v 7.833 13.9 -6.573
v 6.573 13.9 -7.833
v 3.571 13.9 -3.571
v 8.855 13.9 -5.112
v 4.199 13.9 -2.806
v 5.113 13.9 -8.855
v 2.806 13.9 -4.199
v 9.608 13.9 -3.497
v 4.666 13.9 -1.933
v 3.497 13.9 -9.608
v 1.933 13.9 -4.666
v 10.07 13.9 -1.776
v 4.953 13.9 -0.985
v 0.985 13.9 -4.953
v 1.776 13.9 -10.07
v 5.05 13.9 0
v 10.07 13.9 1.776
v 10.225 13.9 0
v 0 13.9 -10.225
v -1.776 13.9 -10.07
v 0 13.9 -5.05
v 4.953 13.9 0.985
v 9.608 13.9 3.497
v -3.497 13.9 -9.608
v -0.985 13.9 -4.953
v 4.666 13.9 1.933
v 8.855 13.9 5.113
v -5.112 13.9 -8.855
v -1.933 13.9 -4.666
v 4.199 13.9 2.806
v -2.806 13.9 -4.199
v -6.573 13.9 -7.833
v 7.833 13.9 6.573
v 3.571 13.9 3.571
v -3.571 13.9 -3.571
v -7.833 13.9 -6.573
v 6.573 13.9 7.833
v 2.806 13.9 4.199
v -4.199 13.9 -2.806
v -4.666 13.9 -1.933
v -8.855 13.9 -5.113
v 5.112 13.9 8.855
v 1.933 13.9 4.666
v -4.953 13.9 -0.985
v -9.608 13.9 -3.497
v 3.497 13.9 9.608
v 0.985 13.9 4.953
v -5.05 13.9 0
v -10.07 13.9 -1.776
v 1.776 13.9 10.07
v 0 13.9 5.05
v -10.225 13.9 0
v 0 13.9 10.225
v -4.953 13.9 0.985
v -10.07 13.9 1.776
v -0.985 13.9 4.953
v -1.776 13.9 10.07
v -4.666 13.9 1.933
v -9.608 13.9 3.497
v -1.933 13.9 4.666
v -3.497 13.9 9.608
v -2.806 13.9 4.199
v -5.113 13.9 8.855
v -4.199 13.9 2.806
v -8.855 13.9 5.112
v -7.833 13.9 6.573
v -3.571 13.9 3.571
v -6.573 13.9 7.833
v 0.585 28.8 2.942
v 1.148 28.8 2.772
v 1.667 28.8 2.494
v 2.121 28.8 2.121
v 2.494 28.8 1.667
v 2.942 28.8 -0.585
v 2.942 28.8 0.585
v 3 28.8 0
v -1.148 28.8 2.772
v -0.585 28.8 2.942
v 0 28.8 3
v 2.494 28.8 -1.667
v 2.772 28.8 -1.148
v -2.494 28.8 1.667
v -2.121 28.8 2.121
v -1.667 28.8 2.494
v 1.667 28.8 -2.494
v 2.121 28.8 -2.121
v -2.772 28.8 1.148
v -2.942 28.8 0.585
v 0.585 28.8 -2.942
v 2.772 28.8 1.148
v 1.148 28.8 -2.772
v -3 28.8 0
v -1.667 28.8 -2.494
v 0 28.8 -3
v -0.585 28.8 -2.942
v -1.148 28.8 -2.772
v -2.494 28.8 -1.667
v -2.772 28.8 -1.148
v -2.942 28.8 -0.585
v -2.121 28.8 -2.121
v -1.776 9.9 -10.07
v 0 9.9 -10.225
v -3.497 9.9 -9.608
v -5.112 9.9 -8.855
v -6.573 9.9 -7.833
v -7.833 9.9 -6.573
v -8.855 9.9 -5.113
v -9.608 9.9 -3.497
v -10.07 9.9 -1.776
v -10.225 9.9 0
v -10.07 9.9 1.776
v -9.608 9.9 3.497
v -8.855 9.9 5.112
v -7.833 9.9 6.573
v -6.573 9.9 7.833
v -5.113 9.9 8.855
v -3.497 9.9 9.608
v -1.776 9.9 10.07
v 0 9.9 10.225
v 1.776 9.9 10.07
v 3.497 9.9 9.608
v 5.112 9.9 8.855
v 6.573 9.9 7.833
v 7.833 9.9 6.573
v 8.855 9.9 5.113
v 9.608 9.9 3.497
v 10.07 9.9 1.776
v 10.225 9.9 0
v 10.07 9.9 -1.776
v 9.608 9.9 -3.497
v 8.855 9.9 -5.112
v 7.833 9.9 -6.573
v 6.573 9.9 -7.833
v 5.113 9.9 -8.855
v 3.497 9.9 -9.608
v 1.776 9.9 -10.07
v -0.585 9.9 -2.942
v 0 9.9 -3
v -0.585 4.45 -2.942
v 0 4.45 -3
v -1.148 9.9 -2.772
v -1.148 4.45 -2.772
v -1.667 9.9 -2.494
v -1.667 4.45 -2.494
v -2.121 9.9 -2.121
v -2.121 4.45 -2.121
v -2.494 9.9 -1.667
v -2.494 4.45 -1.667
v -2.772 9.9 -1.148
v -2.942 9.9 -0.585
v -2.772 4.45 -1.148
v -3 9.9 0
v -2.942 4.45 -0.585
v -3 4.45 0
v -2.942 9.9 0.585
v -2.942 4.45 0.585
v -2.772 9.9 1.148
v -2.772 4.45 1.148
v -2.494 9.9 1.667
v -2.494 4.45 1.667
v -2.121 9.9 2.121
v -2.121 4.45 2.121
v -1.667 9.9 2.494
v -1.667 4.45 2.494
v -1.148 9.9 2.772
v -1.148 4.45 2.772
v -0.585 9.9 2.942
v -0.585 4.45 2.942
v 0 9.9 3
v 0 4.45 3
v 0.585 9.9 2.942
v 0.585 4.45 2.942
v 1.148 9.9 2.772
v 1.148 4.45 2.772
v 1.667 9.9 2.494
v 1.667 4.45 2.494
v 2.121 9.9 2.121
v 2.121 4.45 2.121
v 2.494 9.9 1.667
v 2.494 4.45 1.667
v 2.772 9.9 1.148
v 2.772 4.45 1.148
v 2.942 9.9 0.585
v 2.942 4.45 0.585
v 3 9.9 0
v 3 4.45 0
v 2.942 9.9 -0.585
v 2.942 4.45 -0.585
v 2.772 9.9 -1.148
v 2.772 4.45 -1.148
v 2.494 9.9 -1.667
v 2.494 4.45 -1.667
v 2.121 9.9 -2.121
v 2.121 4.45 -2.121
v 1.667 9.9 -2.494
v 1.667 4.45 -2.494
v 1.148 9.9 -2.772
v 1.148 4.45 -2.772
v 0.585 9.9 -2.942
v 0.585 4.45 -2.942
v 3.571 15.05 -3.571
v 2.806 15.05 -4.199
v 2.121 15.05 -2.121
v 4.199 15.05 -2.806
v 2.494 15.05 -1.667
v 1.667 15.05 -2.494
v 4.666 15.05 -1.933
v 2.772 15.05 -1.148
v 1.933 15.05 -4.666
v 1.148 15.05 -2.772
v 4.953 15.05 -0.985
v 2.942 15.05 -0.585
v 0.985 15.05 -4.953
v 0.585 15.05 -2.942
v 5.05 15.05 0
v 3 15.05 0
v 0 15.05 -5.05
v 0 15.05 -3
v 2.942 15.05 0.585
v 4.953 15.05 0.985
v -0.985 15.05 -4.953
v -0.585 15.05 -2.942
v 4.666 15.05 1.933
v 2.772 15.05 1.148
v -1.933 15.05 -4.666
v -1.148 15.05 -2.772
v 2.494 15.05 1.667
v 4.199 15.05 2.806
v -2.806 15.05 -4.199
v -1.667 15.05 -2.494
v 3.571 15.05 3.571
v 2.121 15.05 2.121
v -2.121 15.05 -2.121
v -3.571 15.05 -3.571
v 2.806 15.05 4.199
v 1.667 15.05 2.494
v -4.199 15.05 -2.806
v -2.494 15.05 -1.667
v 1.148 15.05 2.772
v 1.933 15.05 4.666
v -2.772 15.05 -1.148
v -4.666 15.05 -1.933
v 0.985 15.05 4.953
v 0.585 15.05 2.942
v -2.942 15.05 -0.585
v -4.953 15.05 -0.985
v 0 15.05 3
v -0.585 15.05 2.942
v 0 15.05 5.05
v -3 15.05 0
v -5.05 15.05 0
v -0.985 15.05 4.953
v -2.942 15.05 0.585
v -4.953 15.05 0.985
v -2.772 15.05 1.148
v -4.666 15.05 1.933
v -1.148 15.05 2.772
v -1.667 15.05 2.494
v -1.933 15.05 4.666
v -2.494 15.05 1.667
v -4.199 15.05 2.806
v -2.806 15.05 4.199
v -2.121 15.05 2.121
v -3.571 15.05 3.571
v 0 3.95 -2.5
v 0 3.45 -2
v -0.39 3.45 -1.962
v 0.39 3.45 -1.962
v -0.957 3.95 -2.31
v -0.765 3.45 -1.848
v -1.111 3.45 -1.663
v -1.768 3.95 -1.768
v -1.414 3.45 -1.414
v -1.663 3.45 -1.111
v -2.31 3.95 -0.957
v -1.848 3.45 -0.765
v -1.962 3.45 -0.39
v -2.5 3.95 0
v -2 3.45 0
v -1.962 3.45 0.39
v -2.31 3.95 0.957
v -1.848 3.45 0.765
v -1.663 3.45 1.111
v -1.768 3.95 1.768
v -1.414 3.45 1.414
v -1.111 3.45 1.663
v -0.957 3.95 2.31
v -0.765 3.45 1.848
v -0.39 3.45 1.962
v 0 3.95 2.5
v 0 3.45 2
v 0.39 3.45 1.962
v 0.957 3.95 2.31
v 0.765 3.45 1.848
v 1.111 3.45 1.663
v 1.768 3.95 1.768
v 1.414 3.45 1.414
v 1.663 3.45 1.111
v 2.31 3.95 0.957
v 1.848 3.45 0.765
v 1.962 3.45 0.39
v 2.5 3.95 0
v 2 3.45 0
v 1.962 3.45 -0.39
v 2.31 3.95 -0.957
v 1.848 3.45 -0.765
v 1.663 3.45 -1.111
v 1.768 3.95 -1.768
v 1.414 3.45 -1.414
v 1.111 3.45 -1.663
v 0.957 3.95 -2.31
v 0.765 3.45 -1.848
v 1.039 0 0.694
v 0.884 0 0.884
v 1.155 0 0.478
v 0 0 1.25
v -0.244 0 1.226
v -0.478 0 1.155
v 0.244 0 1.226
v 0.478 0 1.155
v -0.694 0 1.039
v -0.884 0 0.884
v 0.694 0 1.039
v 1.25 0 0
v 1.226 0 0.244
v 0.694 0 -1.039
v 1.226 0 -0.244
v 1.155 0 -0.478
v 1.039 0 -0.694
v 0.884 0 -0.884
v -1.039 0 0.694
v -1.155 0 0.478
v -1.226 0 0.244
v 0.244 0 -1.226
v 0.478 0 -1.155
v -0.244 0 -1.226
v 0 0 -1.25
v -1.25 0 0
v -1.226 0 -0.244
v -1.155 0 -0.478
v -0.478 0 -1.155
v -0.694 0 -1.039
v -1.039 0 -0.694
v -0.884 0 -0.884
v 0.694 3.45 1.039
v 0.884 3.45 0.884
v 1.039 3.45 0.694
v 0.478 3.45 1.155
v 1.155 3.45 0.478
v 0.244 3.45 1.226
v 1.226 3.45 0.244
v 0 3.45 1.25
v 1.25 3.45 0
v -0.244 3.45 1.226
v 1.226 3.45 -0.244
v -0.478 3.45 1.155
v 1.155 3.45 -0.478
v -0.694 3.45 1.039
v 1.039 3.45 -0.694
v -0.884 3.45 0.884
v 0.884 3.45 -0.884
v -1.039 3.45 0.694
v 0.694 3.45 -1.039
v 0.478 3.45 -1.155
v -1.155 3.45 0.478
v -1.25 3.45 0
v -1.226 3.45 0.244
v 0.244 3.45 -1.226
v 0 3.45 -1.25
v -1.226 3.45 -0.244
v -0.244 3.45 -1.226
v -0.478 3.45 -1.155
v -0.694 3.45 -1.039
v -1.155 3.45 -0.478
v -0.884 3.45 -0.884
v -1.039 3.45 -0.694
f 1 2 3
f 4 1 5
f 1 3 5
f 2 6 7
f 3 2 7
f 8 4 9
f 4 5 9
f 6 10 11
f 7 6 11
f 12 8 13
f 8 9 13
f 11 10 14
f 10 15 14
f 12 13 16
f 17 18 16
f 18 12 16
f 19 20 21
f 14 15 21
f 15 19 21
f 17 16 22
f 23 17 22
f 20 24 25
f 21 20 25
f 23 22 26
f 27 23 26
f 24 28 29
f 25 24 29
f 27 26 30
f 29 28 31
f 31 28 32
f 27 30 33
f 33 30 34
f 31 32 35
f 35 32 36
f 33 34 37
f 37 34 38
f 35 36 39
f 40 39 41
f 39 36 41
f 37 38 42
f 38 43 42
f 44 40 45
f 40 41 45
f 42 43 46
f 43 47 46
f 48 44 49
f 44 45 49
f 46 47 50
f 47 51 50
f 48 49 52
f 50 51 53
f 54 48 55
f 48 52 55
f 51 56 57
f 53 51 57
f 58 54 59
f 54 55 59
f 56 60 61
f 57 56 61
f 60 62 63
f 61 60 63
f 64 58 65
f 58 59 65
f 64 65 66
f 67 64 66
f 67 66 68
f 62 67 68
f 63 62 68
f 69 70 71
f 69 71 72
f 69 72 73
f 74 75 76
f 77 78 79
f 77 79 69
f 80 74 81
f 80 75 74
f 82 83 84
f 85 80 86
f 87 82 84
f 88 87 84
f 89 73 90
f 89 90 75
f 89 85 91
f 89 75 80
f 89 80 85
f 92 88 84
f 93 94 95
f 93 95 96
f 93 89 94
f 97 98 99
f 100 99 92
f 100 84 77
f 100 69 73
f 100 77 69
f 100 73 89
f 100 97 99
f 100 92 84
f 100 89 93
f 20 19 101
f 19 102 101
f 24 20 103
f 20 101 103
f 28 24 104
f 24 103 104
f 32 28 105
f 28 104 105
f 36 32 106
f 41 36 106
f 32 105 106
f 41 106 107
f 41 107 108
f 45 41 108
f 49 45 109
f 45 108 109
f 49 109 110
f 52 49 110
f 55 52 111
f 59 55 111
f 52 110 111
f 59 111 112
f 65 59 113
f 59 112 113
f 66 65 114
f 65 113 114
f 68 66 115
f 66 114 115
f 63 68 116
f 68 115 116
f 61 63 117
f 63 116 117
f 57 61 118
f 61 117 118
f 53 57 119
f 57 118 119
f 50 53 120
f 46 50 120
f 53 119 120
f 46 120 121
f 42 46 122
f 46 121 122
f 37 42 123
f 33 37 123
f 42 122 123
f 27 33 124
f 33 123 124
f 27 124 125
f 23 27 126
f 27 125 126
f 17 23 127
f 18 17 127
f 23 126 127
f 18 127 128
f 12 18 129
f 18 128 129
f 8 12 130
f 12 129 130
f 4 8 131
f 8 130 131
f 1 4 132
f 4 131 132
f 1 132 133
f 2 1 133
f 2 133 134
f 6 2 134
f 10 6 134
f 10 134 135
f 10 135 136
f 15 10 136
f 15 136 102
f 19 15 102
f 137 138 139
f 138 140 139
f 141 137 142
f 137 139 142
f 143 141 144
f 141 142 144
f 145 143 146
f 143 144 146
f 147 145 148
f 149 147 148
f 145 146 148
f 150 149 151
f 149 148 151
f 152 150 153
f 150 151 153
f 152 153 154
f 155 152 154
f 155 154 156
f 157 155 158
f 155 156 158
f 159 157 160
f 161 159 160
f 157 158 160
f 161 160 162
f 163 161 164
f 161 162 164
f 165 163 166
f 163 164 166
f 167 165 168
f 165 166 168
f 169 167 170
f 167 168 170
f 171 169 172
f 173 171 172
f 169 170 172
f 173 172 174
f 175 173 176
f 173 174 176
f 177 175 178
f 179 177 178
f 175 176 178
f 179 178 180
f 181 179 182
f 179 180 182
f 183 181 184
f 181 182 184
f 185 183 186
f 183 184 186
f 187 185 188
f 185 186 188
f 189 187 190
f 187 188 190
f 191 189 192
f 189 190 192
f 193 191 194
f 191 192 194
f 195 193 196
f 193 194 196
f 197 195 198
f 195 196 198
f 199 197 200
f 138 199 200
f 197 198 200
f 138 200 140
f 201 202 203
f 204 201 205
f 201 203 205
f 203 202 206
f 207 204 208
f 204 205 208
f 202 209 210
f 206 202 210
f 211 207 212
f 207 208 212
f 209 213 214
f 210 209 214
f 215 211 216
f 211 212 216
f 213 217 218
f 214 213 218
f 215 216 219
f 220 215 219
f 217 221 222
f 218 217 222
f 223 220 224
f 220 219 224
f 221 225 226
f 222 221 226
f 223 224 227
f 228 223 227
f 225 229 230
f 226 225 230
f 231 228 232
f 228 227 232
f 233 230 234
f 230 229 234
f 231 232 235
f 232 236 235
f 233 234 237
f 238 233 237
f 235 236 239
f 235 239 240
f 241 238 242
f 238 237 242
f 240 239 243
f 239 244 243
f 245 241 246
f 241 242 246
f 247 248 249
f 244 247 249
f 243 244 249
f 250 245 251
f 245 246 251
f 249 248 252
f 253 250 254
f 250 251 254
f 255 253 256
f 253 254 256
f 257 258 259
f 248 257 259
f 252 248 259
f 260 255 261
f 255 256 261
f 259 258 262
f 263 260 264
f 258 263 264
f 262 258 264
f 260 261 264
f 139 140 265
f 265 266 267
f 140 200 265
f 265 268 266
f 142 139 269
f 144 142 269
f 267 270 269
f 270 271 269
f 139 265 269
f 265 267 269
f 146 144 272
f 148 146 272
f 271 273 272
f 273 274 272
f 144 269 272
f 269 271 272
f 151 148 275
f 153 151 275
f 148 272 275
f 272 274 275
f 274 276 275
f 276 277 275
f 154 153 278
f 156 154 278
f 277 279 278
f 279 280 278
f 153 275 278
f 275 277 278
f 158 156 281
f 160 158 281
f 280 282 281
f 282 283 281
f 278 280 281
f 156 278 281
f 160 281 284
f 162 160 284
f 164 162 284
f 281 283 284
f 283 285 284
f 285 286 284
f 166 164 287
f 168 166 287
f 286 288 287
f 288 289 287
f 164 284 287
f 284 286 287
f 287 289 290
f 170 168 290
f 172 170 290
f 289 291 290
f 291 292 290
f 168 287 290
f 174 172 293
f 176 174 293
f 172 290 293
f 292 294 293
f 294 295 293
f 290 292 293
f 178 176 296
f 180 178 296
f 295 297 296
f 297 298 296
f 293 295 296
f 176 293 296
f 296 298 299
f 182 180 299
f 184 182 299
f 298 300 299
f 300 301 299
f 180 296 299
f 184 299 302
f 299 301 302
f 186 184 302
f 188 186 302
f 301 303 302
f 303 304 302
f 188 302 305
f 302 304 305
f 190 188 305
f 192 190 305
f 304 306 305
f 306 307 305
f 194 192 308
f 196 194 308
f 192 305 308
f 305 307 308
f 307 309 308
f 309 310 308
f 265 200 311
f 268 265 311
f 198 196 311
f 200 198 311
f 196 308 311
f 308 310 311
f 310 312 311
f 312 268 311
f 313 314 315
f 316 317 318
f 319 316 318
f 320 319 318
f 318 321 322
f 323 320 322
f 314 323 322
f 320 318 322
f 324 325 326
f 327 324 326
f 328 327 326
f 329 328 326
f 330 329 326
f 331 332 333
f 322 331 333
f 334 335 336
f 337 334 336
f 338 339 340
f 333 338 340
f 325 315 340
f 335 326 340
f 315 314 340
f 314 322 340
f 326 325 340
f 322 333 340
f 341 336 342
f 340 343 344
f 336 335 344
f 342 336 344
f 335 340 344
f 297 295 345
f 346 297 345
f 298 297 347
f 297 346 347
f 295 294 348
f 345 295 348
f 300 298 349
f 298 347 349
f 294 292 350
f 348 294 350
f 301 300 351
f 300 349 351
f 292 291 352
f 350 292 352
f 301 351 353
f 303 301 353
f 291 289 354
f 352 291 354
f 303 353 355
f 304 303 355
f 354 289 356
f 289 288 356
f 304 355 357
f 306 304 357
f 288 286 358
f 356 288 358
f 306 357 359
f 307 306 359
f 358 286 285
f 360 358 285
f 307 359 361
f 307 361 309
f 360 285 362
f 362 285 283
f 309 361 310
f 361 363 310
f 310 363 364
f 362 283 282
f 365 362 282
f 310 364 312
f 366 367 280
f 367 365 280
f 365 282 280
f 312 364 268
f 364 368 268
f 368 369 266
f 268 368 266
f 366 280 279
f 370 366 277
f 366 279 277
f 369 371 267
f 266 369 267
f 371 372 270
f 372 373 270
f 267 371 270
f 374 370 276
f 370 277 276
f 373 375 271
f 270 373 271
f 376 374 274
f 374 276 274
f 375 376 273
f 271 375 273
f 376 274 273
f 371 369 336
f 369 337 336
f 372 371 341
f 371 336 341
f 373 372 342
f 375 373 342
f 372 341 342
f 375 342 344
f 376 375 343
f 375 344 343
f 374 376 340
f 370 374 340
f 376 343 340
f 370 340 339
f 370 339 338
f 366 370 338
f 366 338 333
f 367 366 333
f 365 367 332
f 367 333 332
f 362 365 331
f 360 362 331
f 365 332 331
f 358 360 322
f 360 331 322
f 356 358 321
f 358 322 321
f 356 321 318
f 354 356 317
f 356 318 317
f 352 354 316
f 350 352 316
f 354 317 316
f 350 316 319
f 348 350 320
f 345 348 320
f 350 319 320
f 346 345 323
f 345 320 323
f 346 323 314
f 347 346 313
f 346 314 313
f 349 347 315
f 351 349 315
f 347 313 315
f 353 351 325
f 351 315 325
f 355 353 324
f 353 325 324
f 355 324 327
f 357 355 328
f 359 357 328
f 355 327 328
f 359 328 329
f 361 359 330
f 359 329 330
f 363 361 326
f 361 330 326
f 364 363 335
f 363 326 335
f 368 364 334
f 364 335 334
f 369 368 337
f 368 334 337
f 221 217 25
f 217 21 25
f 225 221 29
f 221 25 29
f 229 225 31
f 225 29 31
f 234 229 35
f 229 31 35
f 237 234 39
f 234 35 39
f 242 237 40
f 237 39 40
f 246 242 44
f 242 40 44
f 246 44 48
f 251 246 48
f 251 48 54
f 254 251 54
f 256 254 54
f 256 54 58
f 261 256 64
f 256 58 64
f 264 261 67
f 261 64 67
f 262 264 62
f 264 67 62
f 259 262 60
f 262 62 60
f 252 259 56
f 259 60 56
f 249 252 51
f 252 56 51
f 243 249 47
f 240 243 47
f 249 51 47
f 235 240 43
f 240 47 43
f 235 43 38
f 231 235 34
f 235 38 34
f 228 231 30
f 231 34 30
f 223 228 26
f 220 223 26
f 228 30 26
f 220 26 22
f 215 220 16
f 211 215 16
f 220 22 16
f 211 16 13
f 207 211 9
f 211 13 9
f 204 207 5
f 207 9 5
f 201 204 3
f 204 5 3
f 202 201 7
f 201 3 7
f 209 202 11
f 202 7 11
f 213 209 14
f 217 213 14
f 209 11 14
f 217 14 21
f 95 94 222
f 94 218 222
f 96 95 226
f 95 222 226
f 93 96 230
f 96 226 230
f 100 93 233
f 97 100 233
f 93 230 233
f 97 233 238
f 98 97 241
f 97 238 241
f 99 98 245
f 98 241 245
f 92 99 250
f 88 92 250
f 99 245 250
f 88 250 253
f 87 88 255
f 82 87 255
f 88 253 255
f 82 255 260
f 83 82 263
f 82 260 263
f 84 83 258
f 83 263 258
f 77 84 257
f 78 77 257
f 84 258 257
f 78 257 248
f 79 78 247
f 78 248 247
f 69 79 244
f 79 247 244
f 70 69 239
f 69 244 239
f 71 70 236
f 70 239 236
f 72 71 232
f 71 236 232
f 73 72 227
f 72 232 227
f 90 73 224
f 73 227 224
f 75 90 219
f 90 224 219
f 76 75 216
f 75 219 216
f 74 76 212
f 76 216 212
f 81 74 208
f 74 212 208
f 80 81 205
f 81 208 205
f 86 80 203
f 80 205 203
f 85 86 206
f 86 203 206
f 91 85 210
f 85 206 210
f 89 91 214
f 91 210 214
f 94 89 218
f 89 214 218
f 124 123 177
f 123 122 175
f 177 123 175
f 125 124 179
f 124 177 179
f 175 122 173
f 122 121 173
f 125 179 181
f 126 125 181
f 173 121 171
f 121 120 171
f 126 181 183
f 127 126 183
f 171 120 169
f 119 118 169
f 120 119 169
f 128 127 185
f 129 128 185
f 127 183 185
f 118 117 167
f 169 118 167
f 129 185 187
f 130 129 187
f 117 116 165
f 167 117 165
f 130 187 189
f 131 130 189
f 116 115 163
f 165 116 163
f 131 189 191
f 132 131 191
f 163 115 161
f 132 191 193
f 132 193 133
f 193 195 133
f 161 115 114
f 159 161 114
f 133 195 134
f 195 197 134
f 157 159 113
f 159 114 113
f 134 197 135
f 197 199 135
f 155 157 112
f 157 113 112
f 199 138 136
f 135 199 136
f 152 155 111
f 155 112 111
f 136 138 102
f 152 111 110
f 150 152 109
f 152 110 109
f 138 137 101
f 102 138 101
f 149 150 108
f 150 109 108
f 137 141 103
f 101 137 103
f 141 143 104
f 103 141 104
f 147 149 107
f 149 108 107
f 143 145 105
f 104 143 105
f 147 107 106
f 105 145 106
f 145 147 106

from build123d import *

# Parameters (mm, degrees)
CUT_EXTRUDE_START   = -12
CUT_EXTRUDE_1_DEPTH = 12
CUT_EXTRUDE_START_2 = -13.5
SKETCH_3_R          = 3
CUT_EXTRUDE_2_DEPTH = 13.5


with BuildPart() as part:
    # ｽｹｯﾁ1 → 回転1 (revolve)
    with BuildSketch(Plane.XY, mode=Mode.PRIVATE) as revolve_1_sk:
        Polygon((0, 0), (0, 42.3), (3, 42.3), (3, 15.05), (5.05, 15.05), (5.05, 13.9), (10.225, 13.9), (10.225, 9.9), (3, 9.9), (3, 4.45), (2, 3.45), (1.25, 3.45), (1.25, 0), align=None)
    revolve(revolve_1_sk.sketch.rotate(Axis((0, 0, 0), (0, 1, 0)), 90), axis=Axis((0, 0, 0), (0, 1, 0)))

    # ｽｹｯﾁ2 → ｶｯﾄ - 押し出し1 (cut)
    with BuildSketch(Plane(origin=(0, 42.3, 0), x_dir=(1, 0, 0), z_dir=(0, 1, 0)).offset(CUT_EXTRUDE_START)):
        with BuildLine():
            Line((-1.658312395, 2.5), (1.658312395, 2.5))
            ThreePointArc((1.658312395, 2.5), (0, 3), (-1.658312395, 2.5))
        make_face()
    extrude(amount=CUT_EXTRUDE_1_DEPTH, mode=Mode.SUBTRACT)

    # ｽｹｯﾁ3 → ｶｯﾄ - 押し出し2 (cut)
    with BuildSketch(Plane(origin=(0, 42.3, 0), x_dir=(1, 0, 0), z_dir=(0, 1, 0)).offset(CUT_EXTRUDE_START_2)):
        with Locations(Location((0, 0, 0), (0, 0, 90))):
            Circle(SKETCH_3_R)
    extrude(amount=CUT_EXTRUDE_2_DEPTH, mode=Mode.SUBTRACT)


solid = part.part
